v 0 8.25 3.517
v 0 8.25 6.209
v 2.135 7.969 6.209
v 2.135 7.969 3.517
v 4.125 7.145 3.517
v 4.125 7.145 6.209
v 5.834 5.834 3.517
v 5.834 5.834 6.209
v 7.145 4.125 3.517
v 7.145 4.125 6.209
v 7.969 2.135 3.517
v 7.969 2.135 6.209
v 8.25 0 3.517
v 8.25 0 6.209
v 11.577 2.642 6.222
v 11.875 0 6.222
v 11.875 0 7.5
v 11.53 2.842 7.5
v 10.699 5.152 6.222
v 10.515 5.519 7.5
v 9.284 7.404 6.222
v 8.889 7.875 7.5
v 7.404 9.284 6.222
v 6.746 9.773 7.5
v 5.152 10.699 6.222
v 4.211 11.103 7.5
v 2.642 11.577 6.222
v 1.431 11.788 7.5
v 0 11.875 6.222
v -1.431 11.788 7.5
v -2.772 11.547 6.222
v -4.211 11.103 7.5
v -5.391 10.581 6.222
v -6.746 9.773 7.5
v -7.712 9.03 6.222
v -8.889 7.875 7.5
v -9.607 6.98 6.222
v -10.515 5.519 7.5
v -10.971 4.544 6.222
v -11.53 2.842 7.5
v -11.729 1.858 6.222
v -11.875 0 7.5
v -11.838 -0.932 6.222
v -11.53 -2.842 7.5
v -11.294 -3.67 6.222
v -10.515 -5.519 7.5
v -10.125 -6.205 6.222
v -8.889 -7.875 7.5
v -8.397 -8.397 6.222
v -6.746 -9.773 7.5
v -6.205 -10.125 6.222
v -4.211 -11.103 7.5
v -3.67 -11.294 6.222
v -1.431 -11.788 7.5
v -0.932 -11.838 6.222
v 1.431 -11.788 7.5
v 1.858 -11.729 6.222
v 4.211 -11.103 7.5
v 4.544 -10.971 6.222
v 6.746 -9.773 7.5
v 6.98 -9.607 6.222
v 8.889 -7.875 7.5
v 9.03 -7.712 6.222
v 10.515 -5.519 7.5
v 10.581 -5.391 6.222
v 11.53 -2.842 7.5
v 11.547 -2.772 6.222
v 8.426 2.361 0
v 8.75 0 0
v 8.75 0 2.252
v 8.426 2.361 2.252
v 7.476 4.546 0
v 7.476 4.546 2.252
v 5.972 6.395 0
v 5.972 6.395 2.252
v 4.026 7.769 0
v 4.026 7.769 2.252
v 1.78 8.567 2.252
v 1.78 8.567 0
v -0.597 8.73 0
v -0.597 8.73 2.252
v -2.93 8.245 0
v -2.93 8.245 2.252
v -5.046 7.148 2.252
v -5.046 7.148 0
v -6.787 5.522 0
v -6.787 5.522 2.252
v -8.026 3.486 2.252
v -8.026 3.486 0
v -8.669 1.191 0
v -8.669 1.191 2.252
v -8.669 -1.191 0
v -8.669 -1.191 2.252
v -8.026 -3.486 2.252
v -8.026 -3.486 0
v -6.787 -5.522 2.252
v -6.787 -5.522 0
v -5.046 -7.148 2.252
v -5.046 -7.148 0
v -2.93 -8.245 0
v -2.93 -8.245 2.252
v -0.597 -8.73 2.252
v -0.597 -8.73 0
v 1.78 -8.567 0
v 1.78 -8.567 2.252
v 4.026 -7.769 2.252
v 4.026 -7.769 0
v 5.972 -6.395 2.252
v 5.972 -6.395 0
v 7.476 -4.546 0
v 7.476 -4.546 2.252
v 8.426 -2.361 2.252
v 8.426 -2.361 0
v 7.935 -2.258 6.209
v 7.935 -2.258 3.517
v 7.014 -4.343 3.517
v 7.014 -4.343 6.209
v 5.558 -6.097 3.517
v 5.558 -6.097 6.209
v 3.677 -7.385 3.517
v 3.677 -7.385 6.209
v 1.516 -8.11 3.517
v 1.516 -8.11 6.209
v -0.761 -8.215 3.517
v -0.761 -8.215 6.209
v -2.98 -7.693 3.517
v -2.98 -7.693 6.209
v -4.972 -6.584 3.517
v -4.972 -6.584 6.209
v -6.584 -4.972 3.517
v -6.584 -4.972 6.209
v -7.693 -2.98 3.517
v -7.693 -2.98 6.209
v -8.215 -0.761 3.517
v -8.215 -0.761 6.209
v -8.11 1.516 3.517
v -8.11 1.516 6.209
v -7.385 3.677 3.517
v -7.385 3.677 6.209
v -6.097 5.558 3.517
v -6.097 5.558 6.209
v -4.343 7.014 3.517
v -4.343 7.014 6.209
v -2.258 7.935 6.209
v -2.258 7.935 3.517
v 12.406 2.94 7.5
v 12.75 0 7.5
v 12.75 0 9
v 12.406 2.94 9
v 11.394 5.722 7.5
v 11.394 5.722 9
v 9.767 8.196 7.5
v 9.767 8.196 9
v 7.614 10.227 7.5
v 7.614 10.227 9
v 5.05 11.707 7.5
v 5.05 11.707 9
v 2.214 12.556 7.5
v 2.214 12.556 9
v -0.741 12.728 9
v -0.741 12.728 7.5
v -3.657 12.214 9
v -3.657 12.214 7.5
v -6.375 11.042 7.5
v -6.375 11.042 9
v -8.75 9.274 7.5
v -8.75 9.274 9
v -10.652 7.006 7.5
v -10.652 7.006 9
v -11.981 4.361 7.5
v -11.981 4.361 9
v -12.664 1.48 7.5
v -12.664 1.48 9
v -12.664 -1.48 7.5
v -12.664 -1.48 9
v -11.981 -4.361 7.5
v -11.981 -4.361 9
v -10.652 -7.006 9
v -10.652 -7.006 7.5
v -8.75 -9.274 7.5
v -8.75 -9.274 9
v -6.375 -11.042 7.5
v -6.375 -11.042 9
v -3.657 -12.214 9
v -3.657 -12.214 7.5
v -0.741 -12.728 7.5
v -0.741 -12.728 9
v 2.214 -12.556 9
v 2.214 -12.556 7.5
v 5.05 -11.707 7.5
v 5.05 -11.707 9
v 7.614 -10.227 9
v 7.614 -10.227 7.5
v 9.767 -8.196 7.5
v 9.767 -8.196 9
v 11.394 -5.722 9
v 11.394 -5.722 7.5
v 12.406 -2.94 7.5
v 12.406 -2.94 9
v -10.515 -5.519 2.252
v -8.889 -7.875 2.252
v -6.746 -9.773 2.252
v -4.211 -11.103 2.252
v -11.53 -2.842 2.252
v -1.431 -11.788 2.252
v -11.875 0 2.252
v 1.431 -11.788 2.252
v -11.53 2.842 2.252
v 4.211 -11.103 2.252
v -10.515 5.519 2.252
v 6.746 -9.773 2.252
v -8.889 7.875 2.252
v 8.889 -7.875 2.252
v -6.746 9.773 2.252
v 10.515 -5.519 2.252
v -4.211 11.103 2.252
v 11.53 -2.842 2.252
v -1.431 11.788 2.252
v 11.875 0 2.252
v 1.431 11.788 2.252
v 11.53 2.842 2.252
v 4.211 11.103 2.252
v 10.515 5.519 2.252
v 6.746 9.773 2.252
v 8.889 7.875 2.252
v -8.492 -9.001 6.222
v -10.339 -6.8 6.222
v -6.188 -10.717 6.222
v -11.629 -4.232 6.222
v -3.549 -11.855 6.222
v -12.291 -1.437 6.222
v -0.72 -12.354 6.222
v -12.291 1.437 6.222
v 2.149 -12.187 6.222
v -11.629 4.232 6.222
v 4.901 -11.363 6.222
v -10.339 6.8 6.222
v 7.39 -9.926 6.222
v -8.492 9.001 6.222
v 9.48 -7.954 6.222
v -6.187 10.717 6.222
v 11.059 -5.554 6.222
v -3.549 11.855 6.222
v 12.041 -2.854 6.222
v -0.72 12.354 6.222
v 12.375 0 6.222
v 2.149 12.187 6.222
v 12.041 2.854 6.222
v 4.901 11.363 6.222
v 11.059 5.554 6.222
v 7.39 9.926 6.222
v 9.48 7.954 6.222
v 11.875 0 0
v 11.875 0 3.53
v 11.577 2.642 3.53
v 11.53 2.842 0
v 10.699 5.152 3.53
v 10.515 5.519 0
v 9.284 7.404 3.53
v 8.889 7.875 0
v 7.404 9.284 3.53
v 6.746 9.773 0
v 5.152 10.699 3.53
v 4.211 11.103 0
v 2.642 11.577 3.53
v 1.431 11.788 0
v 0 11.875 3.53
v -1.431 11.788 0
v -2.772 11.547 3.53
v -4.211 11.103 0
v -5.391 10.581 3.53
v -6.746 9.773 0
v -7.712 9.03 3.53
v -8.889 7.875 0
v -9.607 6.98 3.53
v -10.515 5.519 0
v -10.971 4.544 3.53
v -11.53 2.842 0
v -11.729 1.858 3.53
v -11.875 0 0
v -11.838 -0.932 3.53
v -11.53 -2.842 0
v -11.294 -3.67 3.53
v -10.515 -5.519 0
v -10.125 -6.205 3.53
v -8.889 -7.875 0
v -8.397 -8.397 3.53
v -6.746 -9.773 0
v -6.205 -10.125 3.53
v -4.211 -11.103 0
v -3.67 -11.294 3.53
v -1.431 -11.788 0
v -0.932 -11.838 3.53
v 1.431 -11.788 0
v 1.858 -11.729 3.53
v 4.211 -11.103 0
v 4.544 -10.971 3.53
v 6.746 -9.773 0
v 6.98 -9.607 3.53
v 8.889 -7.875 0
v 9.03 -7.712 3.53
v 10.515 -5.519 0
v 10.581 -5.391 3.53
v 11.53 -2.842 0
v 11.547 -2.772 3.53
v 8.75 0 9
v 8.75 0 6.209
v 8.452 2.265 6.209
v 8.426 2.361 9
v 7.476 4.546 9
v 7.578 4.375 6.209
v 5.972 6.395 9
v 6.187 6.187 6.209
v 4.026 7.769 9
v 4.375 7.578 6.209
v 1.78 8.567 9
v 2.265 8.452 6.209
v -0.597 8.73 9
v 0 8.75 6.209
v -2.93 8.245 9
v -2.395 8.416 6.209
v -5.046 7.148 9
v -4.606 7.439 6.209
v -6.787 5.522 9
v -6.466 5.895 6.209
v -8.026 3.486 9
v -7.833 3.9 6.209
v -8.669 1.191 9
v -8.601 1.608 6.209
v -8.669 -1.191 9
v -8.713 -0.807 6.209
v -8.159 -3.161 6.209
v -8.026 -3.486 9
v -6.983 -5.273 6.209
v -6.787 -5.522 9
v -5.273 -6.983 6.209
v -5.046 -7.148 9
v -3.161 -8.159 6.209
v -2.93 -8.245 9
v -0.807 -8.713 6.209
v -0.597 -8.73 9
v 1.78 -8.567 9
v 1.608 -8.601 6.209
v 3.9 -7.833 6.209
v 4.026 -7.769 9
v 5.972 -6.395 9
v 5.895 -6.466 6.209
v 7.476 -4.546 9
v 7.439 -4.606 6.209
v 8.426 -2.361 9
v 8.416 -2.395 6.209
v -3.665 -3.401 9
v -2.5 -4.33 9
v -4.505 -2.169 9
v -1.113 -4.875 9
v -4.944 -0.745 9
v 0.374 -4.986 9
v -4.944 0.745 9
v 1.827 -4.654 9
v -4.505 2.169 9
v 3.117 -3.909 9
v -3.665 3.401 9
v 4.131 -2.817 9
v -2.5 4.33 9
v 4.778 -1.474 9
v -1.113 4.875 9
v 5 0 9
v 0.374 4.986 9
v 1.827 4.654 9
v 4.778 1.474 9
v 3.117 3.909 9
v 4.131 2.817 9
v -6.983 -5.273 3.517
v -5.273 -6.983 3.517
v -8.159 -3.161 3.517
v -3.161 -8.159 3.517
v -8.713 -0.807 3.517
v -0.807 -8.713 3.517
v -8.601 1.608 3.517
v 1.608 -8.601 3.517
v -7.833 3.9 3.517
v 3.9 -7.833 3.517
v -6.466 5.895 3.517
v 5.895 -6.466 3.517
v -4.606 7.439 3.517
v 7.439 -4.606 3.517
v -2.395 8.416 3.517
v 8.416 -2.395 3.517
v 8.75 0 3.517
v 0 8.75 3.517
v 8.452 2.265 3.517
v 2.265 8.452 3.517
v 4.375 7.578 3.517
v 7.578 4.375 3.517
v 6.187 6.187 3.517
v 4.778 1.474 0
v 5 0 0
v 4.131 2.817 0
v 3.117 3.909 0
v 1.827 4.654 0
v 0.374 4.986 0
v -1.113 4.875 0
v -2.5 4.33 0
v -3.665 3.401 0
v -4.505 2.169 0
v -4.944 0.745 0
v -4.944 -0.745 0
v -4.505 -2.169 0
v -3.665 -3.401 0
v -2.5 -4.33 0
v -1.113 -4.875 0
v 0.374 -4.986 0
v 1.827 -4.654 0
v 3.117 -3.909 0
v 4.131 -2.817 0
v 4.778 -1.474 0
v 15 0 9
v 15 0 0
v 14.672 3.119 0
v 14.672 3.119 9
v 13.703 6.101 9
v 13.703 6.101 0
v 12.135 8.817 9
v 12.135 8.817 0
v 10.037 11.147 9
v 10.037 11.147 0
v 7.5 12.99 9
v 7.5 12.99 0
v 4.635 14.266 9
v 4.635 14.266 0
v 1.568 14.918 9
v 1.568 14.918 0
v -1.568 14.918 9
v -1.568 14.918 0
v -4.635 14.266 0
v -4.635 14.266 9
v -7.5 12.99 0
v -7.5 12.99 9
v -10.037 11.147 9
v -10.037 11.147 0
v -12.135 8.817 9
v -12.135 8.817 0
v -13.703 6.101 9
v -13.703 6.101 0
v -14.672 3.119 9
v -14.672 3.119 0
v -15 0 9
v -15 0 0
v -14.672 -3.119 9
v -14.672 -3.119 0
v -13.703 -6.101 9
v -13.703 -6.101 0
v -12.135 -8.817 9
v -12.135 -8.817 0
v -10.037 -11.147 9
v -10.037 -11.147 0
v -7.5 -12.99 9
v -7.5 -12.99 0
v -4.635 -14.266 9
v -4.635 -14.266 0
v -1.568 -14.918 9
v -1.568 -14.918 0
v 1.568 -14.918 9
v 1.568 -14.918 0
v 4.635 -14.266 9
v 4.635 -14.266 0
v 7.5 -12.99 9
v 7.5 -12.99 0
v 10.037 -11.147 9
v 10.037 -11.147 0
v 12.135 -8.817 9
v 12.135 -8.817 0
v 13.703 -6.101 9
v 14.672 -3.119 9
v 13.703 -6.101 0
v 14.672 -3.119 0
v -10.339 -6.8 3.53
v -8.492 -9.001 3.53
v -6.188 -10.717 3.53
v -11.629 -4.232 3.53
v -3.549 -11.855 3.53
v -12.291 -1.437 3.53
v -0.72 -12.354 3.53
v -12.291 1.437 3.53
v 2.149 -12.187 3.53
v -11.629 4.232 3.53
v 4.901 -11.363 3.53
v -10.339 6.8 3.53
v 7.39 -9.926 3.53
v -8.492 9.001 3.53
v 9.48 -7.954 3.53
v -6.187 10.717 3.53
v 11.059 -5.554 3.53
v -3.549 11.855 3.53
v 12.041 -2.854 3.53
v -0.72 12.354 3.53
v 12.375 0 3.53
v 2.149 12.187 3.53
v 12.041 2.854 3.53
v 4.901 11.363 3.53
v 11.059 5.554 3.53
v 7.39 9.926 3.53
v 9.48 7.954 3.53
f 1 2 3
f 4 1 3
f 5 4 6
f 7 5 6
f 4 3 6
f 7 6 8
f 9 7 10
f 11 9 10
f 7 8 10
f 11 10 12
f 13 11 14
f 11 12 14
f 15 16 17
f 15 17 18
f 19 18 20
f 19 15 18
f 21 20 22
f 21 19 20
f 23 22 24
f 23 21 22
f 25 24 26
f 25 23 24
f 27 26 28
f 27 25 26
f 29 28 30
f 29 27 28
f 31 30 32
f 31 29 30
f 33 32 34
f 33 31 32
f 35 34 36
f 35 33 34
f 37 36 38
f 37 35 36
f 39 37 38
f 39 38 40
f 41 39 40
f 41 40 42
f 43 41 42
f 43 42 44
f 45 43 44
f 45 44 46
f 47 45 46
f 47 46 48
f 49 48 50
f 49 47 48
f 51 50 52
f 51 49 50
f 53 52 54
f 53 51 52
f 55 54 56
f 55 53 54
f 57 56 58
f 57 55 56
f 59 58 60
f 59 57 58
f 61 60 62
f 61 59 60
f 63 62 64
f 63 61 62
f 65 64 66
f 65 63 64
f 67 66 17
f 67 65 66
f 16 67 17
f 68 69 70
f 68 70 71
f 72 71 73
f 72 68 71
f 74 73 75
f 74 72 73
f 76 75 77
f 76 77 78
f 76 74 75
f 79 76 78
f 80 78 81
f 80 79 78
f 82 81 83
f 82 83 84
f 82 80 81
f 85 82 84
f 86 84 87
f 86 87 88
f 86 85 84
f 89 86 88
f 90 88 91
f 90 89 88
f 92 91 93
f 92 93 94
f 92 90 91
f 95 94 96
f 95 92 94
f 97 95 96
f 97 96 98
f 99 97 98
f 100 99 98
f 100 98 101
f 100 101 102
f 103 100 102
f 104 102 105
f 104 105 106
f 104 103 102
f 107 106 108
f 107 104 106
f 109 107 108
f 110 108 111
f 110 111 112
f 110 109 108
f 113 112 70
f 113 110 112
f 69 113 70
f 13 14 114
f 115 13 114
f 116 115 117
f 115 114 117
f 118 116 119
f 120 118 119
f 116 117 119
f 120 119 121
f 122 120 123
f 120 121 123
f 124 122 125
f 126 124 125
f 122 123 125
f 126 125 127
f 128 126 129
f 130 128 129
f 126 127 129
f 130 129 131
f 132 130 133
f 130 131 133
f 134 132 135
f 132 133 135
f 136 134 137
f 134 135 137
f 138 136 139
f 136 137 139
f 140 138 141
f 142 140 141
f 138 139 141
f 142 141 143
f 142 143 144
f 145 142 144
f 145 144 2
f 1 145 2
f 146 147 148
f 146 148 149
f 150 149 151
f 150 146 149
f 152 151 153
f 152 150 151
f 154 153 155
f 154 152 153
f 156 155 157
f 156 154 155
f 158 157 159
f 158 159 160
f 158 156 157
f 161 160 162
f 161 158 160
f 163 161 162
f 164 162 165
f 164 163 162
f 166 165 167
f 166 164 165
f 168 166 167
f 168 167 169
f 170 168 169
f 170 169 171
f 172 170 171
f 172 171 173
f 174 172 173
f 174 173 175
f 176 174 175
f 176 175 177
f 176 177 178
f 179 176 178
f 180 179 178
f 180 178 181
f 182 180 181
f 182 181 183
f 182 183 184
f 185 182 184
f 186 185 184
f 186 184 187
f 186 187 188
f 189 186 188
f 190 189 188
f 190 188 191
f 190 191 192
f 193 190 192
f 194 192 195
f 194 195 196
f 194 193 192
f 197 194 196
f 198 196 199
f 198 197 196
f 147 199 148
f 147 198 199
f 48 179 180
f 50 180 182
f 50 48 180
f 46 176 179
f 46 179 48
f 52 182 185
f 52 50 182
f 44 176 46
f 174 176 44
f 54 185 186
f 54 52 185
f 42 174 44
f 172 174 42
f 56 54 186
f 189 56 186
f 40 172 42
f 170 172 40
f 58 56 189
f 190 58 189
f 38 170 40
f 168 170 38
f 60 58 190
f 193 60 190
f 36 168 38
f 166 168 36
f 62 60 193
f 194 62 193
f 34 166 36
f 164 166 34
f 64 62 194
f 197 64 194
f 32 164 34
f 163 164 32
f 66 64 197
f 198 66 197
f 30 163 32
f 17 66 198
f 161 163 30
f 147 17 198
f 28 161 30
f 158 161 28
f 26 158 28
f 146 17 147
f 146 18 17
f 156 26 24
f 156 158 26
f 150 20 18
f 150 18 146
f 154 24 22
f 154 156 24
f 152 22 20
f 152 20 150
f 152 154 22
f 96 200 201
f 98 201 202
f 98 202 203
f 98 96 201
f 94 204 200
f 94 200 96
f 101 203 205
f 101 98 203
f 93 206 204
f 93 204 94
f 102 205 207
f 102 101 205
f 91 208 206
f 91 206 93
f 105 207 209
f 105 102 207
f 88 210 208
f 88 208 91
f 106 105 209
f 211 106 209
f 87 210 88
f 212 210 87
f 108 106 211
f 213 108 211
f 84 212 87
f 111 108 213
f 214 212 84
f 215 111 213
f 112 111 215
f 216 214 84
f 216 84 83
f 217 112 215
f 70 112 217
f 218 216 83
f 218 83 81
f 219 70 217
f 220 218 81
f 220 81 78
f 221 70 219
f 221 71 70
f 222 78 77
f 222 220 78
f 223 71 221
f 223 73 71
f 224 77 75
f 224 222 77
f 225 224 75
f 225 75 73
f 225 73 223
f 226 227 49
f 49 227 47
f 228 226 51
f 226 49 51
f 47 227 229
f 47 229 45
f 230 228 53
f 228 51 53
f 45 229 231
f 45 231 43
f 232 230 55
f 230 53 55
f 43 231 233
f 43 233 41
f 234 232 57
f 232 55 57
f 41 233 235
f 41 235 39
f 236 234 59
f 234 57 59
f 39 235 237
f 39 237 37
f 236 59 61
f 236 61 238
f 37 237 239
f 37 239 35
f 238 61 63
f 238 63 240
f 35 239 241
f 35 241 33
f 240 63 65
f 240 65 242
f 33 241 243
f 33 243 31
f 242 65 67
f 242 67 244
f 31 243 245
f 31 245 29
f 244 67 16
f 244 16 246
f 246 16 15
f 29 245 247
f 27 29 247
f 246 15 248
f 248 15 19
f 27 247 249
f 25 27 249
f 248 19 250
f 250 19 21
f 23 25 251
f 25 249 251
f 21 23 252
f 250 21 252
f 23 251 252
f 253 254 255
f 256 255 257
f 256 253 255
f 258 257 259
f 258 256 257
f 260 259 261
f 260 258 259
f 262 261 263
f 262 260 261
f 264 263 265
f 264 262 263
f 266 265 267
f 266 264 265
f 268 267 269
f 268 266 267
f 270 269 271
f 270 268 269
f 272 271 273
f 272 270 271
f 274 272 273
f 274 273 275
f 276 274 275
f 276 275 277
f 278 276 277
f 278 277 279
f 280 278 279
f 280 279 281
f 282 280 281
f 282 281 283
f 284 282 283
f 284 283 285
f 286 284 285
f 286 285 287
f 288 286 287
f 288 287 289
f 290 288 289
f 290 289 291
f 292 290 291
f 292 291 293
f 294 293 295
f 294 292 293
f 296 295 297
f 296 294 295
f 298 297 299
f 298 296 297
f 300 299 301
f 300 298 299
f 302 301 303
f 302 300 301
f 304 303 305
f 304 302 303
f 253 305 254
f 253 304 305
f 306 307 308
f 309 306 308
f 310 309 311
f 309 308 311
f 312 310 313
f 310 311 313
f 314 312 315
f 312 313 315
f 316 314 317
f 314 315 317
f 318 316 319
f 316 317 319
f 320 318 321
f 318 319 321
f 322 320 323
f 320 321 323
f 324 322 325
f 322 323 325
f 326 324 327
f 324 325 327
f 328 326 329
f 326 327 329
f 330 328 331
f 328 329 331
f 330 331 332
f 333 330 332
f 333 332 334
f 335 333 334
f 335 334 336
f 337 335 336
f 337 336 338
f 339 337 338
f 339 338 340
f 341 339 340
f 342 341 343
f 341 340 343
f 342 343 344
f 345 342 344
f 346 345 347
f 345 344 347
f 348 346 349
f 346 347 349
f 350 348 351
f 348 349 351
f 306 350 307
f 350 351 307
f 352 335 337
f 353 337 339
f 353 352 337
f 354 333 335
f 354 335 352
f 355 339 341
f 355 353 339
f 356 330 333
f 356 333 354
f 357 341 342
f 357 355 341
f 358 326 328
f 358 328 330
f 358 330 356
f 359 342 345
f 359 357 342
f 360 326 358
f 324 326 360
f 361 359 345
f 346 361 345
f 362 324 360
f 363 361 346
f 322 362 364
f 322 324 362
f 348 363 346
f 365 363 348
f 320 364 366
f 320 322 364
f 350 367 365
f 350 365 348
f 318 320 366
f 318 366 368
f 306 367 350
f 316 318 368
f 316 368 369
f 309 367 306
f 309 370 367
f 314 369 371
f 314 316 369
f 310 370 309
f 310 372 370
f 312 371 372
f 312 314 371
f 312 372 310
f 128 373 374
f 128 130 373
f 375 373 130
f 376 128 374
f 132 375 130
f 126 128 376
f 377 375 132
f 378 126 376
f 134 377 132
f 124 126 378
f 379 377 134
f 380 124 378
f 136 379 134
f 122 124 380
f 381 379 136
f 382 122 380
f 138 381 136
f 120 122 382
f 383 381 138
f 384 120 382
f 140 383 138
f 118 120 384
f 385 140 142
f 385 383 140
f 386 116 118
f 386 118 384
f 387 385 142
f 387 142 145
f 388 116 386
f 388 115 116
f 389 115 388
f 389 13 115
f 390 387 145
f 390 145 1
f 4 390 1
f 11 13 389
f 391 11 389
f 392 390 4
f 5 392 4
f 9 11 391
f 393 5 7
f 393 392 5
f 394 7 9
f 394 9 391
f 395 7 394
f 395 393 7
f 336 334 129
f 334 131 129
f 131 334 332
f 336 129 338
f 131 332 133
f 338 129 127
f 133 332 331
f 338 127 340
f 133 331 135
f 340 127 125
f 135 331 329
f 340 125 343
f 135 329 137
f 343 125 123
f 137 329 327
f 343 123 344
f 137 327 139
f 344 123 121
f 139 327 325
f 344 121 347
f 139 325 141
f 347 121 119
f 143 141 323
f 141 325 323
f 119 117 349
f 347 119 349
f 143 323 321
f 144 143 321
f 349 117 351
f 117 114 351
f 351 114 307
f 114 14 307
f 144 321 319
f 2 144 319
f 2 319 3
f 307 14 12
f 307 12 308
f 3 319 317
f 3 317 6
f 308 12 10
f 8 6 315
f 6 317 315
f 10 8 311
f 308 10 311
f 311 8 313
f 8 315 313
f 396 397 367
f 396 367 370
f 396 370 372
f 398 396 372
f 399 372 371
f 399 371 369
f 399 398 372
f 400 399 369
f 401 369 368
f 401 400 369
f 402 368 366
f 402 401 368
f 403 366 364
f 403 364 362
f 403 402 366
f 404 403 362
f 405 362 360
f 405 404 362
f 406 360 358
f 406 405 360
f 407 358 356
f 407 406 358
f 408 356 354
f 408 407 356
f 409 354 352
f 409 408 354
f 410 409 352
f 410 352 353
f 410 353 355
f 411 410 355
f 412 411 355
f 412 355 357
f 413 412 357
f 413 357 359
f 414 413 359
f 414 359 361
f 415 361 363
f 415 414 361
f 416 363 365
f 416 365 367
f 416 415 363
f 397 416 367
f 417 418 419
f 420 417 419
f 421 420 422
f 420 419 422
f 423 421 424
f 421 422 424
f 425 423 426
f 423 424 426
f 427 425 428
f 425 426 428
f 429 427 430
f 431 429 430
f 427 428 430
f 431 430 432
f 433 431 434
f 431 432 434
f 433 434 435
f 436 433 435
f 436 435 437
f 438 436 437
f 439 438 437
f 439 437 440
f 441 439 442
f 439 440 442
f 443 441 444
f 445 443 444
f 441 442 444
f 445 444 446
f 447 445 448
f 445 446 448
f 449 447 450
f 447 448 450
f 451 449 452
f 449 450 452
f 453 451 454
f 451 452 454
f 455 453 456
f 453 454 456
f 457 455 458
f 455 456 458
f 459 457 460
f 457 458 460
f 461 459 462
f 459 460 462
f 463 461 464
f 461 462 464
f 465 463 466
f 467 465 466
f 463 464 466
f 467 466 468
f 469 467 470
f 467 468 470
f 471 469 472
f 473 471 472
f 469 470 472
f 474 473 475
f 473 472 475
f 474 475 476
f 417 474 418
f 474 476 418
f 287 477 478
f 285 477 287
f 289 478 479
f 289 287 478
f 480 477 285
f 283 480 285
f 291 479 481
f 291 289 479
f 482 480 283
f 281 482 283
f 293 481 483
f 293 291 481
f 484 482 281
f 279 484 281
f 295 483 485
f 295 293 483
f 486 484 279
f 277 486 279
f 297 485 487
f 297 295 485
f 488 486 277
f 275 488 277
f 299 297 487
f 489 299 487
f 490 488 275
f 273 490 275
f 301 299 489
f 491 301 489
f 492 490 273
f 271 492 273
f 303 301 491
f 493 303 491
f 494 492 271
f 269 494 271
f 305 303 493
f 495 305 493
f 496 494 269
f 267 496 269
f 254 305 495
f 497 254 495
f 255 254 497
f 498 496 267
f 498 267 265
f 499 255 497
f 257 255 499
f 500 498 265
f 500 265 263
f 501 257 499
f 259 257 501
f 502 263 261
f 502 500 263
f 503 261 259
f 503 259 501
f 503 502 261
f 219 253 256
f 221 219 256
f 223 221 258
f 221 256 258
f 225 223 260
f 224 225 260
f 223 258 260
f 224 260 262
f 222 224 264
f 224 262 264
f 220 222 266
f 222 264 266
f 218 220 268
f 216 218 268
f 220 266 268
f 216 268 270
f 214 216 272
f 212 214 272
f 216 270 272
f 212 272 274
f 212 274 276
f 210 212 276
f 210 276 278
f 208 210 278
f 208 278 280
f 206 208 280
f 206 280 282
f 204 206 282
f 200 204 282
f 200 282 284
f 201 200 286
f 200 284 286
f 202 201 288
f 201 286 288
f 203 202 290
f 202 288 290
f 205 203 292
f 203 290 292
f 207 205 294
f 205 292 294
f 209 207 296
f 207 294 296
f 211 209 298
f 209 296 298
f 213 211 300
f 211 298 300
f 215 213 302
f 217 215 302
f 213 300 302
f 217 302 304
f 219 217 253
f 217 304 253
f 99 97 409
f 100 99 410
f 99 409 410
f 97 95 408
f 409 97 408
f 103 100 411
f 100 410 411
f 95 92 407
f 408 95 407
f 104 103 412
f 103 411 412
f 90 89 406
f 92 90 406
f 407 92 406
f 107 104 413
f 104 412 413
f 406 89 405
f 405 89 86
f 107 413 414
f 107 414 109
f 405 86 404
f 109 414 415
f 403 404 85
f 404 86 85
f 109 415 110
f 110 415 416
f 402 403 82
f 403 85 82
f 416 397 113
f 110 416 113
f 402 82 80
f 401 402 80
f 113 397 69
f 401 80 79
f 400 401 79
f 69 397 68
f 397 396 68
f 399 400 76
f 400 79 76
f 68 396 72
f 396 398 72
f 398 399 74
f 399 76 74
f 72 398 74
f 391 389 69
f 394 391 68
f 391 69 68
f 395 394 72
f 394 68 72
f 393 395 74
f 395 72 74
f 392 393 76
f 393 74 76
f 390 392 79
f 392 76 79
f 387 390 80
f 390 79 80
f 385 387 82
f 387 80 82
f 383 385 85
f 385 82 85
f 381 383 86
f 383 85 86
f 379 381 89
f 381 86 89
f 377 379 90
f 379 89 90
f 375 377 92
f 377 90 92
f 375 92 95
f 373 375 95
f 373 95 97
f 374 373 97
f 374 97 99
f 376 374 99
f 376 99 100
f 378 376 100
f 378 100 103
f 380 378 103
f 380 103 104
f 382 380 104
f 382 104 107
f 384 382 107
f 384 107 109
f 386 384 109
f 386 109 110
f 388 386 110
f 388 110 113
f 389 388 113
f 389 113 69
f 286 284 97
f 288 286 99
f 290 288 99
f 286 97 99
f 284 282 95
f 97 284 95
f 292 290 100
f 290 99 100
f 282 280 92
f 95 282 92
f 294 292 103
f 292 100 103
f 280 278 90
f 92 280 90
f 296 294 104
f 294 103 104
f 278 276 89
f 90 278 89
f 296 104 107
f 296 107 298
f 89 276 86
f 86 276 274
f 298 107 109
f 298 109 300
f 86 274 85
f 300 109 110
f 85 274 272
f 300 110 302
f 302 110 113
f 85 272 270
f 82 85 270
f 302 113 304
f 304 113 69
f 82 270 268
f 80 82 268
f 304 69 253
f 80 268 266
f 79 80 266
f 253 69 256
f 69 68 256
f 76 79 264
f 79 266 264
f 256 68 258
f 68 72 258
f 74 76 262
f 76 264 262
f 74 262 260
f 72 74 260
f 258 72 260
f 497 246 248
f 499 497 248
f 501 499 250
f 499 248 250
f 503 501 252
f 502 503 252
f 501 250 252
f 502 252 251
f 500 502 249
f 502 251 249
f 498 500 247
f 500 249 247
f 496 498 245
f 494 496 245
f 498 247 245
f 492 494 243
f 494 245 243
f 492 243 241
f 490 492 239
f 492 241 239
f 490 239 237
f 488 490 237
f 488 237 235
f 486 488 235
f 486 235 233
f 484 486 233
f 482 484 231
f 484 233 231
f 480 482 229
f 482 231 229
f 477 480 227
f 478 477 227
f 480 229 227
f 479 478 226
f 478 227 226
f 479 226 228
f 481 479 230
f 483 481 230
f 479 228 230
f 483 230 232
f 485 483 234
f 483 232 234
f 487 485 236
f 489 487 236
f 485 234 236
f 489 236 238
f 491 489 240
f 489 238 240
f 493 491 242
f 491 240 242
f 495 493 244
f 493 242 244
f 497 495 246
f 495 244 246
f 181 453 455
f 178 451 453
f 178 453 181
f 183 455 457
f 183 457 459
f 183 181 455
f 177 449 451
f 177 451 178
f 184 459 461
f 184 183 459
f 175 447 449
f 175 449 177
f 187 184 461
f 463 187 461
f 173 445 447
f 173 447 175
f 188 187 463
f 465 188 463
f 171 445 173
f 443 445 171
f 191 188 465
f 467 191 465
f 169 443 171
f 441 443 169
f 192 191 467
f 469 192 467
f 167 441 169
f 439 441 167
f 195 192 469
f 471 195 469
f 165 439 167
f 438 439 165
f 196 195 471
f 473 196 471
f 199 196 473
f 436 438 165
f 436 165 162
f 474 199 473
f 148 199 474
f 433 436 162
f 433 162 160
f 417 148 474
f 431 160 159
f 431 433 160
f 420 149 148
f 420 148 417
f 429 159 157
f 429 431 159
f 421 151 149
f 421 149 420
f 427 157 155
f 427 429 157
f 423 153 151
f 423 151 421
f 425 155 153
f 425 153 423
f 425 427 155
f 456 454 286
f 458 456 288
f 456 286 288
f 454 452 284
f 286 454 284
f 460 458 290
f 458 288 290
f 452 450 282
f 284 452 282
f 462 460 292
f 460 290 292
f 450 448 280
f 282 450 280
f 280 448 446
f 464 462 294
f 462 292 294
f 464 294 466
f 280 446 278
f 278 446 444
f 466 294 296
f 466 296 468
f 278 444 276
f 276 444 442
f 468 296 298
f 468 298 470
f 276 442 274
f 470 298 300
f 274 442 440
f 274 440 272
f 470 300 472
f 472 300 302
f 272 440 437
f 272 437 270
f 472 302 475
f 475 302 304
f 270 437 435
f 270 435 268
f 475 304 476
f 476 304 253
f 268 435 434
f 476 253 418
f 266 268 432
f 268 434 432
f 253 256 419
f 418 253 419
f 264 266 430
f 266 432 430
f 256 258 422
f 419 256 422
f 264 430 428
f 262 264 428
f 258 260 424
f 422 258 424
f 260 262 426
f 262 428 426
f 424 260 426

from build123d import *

# Parameters (mm, degrees)
F0_R     = 15
F0_R_2   = 12.75
F1_DEPTH = 9
F0_R_3   = 8.75
F0_R_4   = 5
F0_R_5   = 11.875
F2_DEPTH = 7.5
F3_DEPTH = 2.252
F5_START = -1.278
F4_R     = 12.375
F5_DEPTH = 2.692
F7_START = -2.791
F7_DEPTH = 2.692


with BuildPart() as f1:
    # F0 (on Top) → F1 (new body)
    with BuildSketch(Plane.XY):
        Circle(F0_R)
        Circle(F0_R_2, mode=Mode.SUBTRACT)
    extrude(amount=F1_DEPTH)

    # F0 (on Top) → F2 (join)
    with BuildSketch(Plane.XY):
        Circle(F0_R_2)
        Circle(F0_R_5, mode=Mode.SUBTRACT)
    extrude(amount=F2_DEPTH)

    # F4 (on face) → F5 (cut)
    with BuildSketch(Plane.XY.offset(7.5).offset(F5_START)):
        Circle(F4_R)
        with BuildLine():
            ThreePointArc((0, 11.875), (8.3968930266, 8.3968930266), (11.875, 0))
            ThreePointArc((11.875, 0), (-8.3968930266, -8.3968930266), (0, 11.875))
        make_face(mode=Mode.SUBTRACT)
    extrude(amount=-F5_DEPTH, mode=Mode.SUBTRACT)


with BuildPart() as f1b:
    # F0 (on Top) → F1, piece 2 (new body)
    with BuildSketch(Plane.XY):
        Circle(F0_R_3)
        Circle(F0_R_4, mode=Mode.SUBTRACT)
    extrude(amount=F1_DEPTH)

    # F6 (on face) → F7 (cut)
    with BuildSketch(Plane.XY.offset(9).offset(F7_START)):
        with BuildLine():
            ThreePointArc((8.75, 0), (6.1871843354, 6.1871843354), (0, 8.75))
            ThreePointArc((0, 8.75), (-6.1871843354, -6.1871843354), (8.75, 0))
        make_face()
        with BuildLine():
            ThreePointArc((8.25, 0), (-5.8336309448, -5.8336309448), (0, 8.25))
            ThreePointArc((0, 8.25), (5.8336309448, 5.8336309448), (8.25, 0))
        make_face(mode=Mode.SUBTRACT)
    extrude(amount=-F7_DEPTH, mode=Mode.SUBTRACT)


with BuildPart() as f3:
    # F0 (on Top) → F3 (new body)
    with BuildSketch(Plane.XY):
        Circle(F0_R_5)
        Circle(F0_R_3, mode=Mode.SUBTRACT)
    extrude(amount=F3_DEPTH)


solid = Compound([f1.part, f1b.part, f3.part])
